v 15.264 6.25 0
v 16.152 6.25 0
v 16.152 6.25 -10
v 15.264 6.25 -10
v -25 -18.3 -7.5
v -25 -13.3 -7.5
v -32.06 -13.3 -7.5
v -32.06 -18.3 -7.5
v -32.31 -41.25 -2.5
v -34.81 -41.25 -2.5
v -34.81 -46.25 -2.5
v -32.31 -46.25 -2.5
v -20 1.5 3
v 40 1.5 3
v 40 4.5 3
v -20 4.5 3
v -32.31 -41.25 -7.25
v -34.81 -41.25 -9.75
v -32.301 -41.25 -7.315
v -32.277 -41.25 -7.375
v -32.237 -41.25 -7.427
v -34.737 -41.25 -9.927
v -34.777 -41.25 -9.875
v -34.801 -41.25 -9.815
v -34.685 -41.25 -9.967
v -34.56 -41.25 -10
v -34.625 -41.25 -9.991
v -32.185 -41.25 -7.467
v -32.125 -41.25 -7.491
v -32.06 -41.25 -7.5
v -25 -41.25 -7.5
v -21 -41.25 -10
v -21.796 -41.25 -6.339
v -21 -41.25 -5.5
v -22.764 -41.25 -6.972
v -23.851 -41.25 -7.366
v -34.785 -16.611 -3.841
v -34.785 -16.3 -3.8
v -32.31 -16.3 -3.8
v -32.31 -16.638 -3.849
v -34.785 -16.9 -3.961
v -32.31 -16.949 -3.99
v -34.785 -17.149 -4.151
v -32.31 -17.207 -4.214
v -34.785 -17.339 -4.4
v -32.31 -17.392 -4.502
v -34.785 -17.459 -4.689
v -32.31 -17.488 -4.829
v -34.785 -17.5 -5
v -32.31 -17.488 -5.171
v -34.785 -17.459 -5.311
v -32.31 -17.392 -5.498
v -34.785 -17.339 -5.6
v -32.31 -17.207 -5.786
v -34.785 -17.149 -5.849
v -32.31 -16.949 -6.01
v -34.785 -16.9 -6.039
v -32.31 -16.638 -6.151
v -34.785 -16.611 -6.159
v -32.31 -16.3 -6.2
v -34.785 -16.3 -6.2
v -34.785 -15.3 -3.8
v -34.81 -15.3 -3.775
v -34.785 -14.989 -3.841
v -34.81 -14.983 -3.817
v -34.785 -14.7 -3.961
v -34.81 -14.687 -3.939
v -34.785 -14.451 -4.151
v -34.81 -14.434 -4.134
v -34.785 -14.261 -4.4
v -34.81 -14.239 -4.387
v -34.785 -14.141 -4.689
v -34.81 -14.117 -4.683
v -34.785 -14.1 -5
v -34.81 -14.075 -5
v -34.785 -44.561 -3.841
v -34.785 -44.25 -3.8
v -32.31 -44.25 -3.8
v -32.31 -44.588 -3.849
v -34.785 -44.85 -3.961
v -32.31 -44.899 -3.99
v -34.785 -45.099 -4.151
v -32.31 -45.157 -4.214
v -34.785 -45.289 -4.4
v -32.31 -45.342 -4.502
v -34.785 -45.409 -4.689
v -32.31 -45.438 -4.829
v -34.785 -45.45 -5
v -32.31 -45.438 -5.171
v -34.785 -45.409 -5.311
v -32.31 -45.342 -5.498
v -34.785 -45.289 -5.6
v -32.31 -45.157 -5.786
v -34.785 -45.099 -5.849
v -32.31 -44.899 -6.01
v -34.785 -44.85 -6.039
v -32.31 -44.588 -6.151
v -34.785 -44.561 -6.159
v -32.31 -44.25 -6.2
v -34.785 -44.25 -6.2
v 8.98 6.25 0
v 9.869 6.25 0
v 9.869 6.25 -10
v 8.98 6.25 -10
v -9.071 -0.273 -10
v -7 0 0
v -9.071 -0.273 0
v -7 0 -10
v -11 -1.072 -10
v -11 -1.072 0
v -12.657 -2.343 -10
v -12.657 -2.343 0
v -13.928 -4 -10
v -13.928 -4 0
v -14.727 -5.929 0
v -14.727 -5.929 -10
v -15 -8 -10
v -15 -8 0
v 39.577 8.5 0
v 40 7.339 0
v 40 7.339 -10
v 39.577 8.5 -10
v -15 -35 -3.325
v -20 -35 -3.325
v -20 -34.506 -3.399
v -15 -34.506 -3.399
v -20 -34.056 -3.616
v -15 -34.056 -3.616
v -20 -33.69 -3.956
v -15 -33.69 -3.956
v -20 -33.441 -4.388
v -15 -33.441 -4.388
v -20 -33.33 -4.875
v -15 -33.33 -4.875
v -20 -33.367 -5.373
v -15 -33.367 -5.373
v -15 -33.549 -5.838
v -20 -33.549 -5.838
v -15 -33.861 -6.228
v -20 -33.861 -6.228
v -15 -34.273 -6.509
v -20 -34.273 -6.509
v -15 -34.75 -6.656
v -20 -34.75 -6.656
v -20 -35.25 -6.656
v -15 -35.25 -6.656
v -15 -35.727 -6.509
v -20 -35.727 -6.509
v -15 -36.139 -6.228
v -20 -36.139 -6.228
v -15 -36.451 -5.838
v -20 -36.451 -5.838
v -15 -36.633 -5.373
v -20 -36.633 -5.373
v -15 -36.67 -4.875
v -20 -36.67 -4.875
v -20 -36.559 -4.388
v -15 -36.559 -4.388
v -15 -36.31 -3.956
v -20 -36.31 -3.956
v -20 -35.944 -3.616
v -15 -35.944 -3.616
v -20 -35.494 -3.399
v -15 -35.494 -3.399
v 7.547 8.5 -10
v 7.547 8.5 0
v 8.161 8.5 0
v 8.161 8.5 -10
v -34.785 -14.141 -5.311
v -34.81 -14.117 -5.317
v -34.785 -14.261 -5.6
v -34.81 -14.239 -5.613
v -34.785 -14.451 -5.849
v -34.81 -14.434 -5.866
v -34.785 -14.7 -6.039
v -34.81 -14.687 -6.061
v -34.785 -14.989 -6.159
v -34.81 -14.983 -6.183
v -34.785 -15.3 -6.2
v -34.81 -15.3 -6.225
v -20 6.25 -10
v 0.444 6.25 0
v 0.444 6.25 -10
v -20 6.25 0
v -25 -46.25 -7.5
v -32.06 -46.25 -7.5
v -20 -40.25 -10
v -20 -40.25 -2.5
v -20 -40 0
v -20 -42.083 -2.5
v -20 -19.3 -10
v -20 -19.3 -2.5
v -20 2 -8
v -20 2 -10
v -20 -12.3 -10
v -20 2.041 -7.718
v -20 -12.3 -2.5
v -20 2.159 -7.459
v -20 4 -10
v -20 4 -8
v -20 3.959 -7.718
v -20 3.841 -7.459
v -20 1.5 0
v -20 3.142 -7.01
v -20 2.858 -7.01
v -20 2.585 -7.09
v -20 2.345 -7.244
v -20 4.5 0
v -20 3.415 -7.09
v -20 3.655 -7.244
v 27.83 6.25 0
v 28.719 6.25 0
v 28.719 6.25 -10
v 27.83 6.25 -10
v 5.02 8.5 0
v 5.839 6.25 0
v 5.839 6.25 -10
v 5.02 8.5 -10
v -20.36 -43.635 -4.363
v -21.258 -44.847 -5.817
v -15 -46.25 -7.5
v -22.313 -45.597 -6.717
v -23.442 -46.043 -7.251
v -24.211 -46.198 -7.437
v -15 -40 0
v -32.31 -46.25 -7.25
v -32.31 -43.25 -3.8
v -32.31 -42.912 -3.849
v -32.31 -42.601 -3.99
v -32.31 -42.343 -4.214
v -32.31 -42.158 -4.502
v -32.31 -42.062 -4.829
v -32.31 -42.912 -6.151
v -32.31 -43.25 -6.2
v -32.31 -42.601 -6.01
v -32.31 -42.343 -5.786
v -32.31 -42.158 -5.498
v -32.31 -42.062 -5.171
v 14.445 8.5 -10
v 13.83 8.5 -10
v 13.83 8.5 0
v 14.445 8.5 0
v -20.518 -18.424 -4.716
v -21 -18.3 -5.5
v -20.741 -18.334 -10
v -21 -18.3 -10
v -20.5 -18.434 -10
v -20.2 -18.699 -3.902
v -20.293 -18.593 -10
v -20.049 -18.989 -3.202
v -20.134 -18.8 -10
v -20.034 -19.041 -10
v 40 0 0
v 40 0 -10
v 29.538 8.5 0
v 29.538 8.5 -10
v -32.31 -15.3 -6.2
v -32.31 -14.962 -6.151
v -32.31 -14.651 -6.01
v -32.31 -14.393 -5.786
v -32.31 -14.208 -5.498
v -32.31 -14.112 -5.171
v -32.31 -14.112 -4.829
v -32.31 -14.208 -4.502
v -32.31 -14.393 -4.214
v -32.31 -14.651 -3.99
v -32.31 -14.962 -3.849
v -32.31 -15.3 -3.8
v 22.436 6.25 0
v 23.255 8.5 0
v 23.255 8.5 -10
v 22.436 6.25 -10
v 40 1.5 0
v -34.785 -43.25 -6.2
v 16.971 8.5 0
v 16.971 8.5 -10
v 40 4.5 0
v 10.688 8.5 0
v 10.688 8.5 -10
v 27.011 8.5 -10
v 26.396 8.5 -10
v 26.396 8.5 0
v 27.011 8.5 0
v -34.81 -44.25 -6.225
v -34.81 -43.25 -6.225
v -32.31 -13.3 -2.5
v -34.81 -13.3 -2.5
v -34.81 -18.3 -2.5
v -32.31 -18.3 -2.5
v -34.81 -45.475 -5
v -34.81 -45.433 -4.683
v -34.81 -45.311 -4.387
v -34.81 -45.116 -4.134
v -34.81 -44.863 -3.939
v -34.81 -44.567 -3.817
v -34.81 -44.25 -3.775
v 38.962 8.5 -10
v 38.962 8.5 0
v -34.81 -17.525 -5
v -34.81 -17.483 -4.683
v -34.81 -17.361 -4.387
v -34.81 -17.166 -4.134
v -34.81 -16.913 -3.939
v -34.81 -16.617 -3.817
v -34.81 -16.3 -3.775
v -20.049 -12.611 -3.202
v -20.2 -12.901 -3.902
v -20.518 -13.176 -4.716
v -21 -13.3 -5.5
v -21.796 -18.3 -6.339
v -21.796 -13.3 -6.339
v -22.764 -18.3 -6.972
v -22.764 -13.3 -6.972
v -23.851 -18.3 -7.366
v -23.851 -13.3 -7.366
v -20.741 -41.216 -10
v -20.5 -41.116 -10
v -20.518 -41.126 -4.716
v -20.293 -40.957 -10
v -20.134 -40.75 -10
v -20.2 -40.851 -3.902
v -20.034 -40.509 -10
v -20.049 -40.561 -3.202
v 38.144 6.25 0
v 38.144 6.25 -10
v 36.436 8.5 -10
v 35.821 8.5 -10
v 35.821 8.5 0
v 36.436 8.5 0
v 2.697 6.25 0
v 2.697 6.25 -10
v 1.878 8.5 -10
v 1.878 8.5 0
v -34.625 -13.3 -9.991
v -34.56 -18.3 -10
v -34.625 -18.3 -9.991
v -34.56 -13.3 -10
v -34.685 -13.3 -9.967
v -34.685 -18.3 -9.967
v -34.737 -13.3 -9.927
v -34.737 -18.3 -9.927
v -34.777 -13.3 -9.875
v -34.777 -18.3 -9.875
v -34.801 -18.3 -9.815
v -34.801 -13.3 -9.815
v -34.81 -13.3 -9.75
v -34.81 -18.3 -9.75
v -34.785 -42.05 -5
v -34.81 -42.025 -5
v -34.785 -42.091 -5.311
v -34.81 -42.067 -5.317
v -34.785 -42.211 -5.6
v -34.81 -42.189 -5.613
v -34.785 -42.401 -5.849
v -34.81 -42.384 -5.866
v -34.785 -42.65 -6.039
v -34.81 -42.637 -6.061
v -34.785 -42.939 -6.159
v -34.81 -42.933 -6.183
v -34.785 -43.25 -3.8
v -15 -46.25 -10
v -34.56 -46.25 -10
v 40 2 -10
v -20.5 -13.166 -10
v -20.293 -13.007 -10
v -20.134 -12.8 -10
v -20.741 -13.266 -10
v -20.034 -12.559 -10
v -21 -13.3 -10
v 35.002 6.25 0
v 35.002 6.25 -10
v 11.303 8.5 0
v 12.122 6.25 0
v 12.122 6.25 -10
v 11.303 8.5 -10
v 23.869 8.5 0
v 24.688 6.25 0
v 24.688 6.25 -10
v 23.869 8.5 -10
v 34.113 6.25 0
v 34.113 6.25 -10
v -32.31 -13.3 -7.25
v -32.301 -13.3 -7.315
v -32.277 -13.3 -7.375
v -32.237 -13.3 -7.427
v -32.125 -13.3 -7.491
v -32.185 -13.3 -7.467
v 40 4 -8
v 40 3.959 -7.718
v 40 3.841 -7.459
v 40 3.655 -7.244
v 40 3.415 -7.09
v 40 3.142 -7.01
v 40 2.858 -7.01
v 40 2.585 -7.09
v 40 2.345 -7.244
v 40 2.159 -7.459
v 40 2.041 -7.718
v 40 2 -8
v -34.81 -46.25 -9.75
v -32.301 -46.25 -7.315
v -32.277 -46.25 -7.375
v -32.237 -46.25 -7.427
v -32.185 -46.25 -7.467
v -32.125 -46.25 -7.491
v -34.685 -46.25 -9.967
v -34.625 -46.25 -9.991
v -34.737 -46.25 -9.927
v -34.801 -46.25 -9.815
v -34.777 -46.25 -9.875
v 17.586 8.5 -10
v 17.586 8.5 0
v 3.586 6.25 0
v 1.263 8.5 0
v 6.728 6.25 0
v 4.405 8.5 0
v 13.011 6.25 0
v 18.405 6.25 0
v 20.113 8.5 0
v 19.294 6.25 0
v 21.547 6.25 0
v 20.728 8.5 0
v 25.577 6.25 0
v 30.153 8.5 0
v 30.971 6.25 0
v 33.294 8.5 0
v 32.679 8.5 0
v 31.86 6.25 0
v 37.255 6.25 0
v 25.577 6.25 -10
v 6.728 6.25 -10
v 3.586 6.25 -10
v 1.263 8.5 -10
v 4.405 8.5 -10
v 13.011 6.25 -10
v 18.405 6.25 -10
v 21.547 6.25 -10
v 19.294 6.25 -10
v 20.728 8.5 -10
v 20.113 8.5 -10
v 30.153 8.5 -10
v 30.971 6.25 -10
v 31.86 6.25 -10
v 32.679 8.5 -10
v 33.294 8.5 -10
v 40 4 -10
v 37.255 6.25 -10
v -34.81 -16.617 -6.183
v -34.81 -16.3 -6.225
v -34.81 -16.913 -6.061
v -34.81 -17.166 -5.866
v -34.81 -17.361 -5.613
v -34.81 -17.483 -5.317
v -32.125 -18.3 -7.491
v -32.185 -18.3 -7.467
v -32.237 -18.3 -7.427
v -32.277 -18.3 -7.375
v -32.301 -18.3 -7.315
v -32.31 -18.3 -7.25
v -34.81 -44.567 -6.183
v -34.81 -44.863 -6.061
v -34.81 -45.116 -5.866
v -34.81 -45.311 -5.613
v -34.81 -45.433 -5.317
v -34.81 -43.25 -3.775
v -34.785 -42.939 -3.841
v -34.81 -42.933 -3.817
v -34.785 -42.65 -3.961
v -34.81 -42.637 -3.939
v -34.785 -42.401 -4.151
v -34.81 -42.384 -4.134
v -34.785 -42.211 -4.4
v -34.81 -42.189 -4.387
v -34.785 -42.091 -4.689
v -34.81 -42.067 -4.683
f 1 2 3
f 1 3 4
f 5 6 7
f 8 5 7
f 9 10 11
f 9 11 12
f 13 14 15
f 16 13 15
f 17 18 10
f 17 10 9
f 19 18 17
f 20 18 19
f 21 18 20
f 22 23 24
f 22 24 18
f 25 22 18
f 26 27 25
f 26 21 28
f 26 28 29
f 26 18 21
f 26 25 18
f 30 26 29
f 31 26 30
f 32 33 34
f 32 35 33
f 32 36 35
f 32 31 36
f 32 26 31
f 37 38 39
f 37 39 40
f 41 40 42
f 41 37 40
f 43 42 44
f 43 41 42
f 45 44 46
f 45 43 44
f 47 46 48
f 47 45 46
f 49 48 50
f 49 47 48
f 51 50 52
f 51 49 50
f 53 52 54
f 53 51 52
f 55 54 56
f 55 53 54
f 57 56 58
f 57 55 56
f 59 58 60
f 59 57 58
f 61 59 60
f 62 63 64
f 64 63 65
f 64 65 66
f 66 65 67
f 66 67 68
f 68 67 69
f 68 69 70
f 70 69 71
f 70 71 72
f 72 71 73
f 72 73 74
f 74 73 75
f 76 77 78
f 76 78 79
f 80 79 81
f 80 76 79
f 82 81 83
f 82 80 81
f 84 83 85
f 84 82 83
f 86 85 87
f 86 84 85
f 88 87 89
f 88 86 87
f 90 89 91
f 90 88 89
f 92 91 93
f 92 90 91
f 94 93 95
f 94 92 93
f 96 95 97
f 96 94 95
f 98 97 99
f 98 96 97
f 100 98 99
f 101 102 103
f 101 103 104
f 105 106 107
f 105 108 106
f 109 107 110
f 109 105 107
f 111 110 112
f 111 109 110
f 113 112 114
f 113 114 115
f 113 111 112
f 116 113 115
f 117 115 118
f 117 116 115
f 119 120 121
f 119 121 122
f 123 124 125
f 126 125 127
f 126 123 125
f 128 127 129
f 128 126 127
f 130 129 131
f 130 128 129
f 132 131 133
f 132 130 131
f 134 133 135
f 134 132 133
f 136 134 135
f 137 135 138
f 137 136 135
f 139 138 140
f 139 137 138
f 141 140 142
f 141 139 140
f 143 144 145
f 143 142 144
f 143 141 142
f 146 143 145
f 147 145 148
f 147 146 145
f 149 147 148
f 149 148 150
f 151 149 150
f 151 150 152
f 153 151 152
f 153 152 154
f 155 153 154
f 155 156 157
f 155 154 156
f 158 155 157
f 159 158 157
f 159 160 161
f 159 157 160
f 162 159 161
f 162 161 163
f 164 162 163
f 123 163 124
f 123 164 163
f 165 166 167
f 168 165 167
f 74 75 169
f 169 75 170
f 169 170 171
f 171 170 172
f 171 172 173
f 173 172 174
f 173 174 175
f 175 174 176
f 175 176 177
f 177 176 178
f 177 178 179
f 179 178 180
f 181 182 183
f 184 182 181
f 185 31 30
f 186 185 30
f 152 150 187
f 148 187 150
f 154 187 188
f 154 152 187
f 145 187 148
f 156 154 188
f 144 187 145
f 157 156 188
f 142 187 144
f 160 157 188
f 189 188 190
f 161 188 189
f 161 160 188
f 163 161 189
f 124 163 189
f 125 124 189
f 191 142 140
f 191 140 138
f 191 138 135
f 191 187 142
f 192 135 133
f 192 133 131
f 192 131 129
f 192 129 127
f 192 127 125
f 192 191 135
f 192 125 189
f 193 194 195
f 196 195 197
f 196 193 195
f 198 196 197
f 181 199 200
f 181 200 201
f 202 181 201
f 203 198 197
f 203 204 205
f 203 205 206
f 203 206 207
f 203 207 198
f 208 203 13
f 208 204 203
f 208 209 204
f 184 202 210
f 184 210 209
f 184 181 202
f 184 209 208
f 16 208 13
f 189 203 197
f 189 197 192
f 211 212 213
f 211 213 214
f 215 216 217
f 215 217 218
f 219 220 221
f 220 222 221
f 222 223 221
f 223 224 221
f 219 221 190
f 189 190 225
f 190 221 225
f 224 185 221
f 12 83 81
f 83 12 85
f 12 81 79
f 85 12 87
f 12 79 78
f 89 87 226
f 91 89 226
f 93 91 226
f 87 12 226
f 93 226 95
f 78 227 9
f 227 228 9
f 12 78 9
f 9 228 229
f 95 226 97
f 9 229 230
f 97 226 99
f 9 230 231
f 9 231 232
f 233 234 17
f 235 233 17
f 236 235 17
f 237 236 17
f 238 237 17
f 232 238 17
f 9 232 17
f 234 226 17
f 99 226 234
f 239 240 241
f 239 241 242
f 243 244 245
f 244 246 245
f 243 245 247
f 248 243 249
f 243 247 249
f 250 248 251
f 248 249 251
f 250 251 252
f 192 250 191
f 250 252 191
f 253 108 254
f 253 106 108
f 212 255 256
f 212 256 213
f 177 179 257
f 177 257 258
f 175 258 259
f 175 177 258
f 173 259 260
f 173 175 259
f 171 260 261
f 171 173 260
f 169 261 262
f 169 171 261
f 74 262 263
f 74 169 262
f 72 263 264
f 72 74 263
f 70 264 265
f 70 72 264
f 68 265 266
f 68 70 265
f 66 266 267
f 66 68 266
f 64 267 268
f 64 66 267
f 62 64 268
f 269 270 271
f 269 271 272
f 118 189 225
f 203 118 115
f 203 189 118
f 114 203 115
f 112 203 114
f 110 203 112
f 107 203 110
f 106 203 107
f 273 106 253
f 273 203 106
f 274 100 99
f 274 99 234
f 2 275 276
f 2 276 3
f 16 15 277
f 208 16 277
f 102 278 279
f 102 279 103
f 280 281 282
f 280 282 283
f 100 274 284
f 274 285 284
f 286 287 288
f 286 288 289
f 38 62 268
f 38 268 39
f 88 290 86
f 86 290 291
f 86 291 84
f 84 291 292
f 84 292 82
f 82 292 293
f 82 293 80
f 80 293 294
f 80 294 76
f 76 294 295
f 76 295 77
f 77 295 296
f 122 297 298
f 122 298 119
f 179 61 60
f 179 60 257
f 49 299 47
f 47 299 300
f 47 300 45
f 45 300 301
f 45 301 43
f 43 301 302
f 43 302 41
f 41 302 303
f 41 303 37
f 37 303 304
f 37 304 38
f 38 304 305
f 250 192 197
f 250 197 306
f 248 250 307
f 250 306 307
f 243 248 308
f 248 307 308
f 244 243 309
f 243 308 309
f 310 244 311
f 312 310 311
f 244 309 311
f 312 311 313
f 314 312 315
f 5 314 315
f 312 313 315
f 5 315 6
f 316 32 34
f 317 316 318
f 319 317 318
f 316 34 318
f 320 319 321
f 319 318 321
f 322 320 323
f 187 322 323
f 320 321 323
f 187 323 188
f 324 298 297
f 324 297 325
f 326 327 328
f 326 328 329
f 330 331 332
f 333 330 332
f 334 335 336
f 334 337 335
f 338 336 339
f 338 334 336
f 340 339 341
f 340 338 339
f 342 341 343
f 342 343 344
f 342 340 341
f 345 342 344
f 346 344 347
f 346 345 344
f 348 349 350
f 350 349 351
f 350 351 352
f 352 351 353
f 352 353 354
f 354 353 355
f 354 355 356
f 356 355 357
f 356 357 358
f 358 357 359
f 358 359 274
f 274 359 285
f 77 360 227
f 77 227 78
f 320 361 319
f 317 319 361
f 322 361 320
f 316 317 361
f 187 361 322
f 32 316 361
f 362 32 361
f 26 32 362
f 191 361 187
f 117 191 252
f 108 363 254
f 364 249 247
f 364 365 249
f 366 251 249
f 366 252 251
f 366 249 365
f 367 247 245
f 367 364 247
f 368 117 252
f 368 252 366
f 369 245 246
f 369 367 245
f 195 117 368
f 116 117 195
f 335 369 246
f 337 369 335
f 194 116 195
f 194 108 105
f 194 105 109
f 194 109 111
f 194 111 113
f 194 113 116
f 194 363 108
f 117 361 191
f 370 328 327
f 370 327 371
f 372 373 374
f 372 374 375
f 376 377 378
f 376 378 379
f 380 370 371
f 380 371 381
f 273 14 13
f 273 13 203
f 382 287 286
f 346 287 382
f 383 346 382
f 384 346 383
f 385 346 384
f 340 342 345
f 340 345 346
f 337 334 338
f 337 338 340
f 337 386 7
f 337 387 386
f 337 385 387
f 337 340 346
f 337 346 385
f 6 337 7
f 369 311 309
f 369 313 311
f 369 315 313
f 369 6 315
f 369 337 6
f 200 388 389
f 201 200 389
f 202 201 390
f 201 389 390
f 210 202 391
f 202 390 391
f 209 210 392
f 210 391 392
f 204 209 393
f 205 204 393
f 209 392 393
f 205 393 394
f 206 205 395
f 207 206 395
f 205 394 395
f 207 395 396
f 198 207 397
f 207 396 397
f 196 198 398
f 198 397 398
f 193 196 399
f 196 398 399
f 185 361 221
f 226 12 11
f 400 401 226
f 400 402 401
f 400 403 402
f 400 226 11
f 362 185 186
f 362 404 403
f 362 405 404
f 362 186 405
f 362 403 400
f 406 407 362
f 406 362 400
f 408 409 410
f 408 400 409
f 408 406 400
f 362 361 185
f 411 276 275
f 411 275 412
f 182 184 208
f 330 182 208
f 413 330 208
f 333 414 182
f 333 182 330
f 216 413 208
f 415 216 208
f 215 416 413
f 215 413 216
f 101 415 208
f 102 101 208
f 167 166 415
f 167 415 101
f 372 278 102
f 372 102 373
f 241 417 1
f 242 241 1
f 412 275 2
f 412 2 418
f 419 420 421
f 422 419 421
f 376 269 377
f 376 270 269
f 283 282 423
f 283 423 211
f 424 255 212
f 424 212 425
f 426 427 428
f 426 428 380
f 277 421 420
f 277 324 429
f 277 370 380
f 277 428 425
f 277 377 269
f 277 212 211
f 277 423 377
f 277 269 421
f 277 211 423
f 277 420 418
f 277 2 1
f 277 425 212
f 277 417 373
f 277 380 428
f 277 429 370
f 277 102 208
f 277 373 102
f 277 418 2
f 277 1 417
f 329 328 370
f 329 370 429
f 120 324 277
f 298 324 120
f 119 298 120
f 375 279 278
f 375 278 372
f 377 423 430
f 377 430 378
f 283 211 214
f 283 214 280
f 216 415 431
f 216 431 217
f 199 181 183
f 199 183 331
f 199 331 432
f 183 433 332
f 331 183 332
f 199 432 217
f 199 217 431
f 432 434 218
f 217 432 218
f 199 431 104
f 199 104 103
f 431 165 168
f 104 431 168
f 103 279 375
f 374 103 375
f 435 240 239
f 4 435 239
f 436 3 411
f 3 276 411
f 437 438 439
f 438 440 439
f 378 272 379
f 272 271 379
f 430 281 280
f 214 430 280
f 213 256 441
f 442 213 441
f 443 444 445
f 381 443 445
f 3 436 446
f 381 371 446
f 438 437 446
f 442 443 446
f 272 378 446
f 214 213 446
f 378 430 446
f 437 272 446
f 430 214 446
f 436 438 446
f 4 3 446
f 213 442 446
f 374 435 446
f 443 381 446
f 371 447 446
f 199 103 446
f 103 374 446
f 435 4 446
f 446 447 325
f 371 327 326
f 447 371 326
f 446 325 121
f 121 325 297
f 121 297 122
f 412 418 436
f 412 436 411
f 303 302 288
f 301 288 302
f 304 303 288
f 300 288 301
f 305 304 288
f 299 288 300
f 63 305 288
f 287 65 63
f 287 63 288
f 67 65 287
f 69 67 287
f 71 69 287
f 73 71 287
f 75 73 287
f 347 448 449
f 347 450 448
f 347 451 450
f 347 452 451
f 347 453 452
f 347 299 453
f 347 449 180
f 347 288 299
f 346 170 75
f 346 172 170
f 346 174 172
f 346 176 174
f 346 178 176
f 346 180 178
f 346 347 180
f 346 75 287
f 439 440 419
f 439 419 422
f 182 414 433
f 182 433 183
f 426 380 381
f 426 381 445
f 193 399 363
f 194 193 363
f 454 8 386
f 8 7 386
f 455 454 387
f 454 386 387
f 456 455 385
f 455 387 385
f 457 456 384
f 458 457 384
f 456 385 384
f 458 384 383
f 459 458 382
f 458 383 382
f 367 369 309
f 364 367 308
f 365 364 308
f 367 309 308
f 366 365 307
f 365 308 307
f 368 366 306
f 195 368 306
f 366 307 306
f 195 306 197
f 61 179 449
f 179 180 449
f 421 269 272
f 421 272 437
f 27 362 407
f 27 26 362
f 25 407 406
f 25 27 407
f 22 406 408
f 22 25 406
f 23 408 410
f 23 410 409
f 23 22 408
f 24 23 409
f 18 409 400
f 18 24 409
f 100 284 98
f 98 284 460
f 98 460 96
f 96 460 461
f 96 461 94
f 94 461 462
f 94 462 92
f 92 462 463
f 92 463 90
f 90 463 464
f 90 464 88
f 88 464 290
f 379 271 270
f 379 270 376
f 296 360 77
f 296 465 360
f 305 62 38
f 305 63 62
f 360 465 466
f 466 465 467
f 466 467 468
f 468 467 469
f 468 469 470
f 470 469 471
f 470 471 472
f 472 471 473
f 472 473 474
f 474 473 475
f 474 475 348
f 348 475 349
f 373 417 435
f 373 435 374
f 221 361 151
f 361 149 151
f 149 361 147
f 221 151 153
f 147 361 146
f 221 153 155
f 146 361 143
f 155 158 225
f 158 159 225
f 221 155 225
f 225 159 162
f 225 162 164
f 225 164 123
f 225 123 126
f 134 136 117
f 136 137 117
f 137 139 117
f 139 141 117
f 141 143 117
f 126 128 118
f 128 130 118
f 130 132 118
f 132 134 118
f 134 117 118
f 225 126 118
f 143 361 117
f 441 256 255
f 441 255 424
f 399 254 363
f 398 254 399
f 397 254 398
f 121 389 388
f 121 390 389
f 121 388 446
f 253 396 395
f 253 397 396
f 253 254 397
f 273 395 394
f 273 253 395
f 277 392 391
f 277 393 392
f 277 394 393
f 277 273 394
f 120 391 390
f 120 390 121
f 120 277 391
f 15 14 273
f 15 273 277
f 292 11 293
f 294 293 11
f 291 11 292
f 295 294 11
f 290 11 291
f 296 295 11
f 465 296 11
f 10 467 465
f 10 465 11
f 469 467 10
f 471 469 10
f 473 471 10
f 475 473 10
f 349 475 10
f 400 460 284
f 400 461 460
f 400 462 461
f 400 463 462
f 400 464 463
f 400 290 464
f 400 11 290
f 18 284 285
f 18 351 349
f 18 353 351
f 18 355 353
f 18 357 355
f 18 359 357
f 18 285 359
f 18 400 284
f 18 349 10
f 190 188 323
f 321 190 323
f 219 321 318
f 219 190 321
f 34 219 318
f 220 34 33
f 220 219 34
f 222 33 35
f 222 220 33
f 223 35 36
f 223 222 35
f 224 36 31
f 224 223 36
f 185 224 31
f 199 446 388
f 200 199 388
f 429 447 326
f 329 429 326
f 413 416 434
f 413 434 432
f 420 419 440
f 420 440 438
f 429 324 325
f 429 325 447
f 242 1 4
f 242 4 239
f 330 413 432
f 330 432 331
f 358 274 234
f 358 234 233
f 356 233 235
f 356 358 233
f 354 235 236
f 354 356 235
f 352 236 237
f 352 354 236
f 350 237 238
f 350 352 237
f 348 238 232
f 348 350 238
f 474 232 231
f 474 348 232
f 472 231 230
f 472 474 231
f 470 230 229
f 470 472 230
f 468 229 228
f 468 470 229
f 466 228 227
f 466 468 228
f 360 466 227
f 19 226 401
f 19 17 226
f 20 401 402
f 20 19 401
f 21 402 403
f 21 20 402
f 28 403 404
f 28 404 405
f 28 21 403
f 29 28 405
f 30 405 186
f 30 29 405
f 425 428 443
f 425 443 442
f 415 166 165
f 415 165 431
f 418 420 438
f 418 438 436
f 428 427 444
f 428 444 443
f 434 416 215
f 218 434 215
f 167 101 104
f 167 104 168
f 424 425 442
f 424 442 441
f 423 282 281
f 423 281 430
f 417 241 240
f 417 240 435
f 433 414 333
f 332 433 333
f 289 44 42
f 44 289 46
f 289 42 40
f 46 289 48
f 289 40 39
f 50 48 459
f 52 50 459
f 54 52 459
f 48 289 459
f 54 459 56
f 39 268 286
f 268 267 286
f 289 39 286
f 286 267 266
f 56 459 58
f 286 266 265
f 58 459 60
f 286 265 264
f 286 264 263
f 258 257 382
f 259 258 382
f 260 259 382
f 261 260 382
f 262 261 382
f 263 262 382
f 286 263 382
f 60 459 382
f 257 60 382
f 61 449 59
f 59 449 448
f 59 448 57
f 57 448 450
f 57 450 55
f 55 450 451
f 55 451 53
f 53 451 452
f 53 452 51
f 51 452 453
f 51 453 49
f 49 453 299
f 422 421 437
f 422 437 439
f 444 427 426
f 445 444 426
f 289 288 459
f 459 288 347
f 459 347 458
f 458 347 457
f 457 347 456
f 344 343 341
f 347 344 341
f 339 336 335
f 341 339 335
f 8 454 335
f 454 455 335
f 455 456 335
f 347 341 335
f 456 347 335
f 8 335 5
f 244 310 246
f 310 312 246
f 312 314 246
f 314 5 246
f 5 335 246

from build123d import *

# Parameters (mm, degrees)
BLANKSKE_W               = 40
BLANKSKE_H               = 8.5
BLANK_DEPTH              = 10
TOOTHCUTSIM_DEPTH        = 43.09809972
TEETHCUTS_COUNT          = 14
TEETHCUTS_PITCH          = 3.14159265
BOSS_EXTRUDE1_DEPTH      = 10
SKETCH2_W                = 3
SKETCH2_H                = 3
BOSS_EXTRUDE2_DEPTH      = 60
CUT_EXTRUDE2_DEPTH       = 73.801098893
MOVE_FACE2_BY            = 5
FILLET2_R                = 8
SKETCH3_R                = 1.675
CUT_EXTRUDE1_DEPTH       = 69.738635424
SKETCH6_W                = 14.81
SKETCH6_H                = 5
BOSS_EXTRUDE3_DEPTH      = 2.5
SKETCH7_W                = 2.5
SKETCH7_H                = 5
BOSS_EXTRUDE4_DEPTH      = 5
M2_START                 = -34.81
M2_CLEARANCE_SLOT1_DEPTH = 2.5
BOSS_EXTRUDE5_DEPTH      = 5
FILLET3_R                = 5
FILLET4_R                = 1
FILLET5_R                = 0.25


with BuildPart() as part:
    # BlankSke → Blank (new body)
    with BuildSketch(Plane.XY):
        with Locations((20, 4.25)):
            Rectangle(BLANKSKE_W, BLANKSKE_H)
    extrude(amount=-BLANK_DEPTH)

    # TooCutSkeSim → ToothCutSim (cut, through all)
    with BuildSketch(Plane.XY):
        Polygon((0.44443537, 6.25), (-0.44443537, 6.25), (-1.272613241, 8.5254), (1.272613241, 8.5254), align=None)
    toothcutsim = extrude(amount=-TOOTHCUTSIM_DEPTH, mode=Mode.SUBTRACT)

    # TeethCuts: ToothCutSim ×14
    with Locations(*[(i * TEETHCUTS_PITCH, 0, 0) for i in range(1, TEETHCUTS_COUNT)]):
        add(toothcutsim, mode=Mode.SUBTRACT)

    # Sketch1 → Boss-Extrude1 (add)
    with BuildSketch(Plane.XY):
        Polygon((-20, 0), (-20, -40), (-10, -40), (-10, 0), (0, 0), (0, 6.25), (-20, 6.25), align=None)
    extrude(amount=-BOSS_EXTRUDE1_DEPTH)

    # Sketch2 → Boss-Extrude2 (add)
    with BuildSketch(Plane(origin=(40, 0, 0), x_dir=(0, 0, -1), z_dir=(1, 0, 0))):
        with Locations((-1.5, 3)):
            Rectangle(SKETCH2_W, SKETCH2_H)
    extrude(amount=-BOSS_EXTRUDE2_DEPTH)

    # Sketch5 → Cut-Extrude2 (cut, through all)
    with BuildSketch(Plane(origin=(40, 0, 0), x_dir=(0, 0, -1), z_dir=(1, 0, 0))):
        with BuildLine():
            Line((10, 2), (10, 4))
            Line((10, 4), (8, 4))
            ThreePointArc((8, 4), (7, 3), (8, 2))
            Line((8, 2), (10, 2))
        make_face()
    extrude(amount=-CUT_EXTRUDE2_DEPTH, mode=Mode.SUBTRACT)

    # Move Face2: a face moved inward by 5.0
    extrude(part.faces().sort_by_distance((-10, -20, -5))[0], amount=MOVE_FACE2_BY, dir=(-1, 0, 0), mode=Mode.SUBTRACT)

    # Fillet2
    fillet2_edges = [part.edges().sort_by_distance(p)[0] for p in [
        (-15, 0, -5),
    ]]
    fillet(fillet2_edges, radius=FILLET2_R)

    # Sketch3 → Cut-Extrude1 (cut, through all)
    with BuildSketch(Plane.ZY.offset(15)):
        with Locations((-5, -35)):
            Circle(SKETCH3_R)
    extrude(amount=CUT_EXTRUDE1_DEPTH, mode=Mode.SUBTRACT)

    # Sketch6 → Boss-Extrude3 (add)
    with BuildSketch(Plane(origin=(0, 0, -10), x_dir=(-1, 0, 0), z_dir=(0, 0, -1))):
        with Locations((27.405, -15.8)):
            Rectangle(SKETCH6_W, SKETCH6_H)
        Polygon((20, -40), (15, -40), (15, -46.25), (34.81, -46.25), (34.81, -41.25), (20, -41.25), align=None)
    extrude(amount=-BOSS_EXTRUDE3_DEPTH)

    # Sketch7 → Boss-Extrude4 (add)
    with BuildSketch(Plane.XY.offset(-7.5)):
        with Locations((-33.56, -15.8)):
            Rectangle(SKETCH7_W, SKETCH7_H)
        with Locations((-33.56, -43.75)):
            Rectangle(SKETCH7_W, SKETCH7_H)
    extrude(amount=BOSS_EXTRUDE4_DEPTH)

    # M2 Clearance Slot1: read off the stored shape, not the designer's step
    # M2 Clearance Slot1 outline → M2 Clearance Slot1 (cut)
    with BuildSketch(Plane.YZ.offset(M2_START)):
        with BuildLine():
            ThreePointArc((-44.25, -3.8), (-45.45, -5), (-44.25, -6.2))
            Line((-44.25, -6.2), (-43.25, -6.2))
            ThreePointArc((-43.25, -6.2), (-42.05, -5), (-43.25, -3.8))
            Line((-43.25, -3.8), (-44.25, -3.8))
        make_face()
        with BuildLine():
            ThreePointArc((-16.3, -3.8), (-17.5, -5), (-16.3, -6.2))
            Line((-16.3, -6.2), (-15.3, -6.2))
            ThreePointArc((-15.3, -6.2), (-14.1, -5), (-15.3, -3.8))
            Line((-15.3, -3.8), (-16.3, -3.8))
        make_face()
    extrude(amount=M2_CLEARANCE_SLOT1_DEPTH, mode=Mode.SUBTRACT)

    # M2 Clearance Slot1 2: loft between two sections, ruled curve by curve
    m2_clearance_slot1_2_from = [
        Edge.make_three_point_arc((-34.785, -43.25, -3.8), (-34.785, -42.401471863, -4.151471863), (-34.785, -42.05, -5)),
        Edge.make_three_point_arc((-34.785, -42.05, -5), (-34.785, -42.401471863, -5.848528137), (-34.785, -43.25, -6.2)),
        Edge.make_three_point_arc((-34.785, -44.25, -6.2), (-34.785, -45.098528137, -5.848528137), (-34.785, -45.45, -5)),
        Edge.make_three_point_arc((-34.785, -45.45, -5), (-34.785, -45.098528137, -4.151471863), (-34.785, -44.25, -3.8)),
        Edge.make_line((-34.785, -43.25, -6.2), (-34.785, -44.25, -6.2)),
        Edge.make_line((-34.785, -43.25, -3.8), (-34.785, -44.25, -3.8)),
    ]
    m2_clearance_slot1_2_to = [
        Edge.make_three_point_arc((-34.81, -43.25, -3.775), (-34.81, -42.383794193, -4.133794193), (-34.81, -42.025, -5)),
        Edge.make_three_point_arc((-34.81, -42.025, -5), (-34.81, -42.383794193, -5.866205807), (-34.81, -43.25, -6.225)),
        Edge.make_three_point_arc((-34.81, -44.25, -6.225), (-34.81, -45.116205807, -5.866205807), (-34.81, -45.475, -5)),
        Edge.make_three_point_arc((-34.81, -45.475, -5), (-34.81, -45.116205807, -4.133794193), (-34.81, -44.25, -3.775)),
        Edge.make_line((-34.81, -43.25, -6.225), (-34.81, -44.25, -6.225)),
        Edge.make_line((-34.81, -43.25, -3.775), (-34.81, -44.25, -3.775)),
    ]
    m2_clearance_slot1_2 = Solid(Shell([*[Face.make_surface_from_curves(m2_clearance_slot1_2_from[k], m2_clearance_slot1_2_to[k]) for k in range(6)], Face(Wire(m2_clearance_slot1_2_from)), Face(Wire(m2_clearance_slot1_2_to))]))
    add(m2_clearance_slot1_2, mode=Mode.SUBTRACT)

    # M2 Clearance Slot1 3: loft between two sections, ruled curve by curve
    m2_clearance_slot1_3_from = [
        Edge.make_three_point_arc((-34.785, -15.3, -3.8), (-34.785, -14.451471863, -4.151471863), (-34.785, -14.1, -5)),
        Edge.make_three_point_arc((-34.785, -14.1, -5), (-34.785, -14.451471863, -5.848528137), (-34.785, -15.3, -6.2)),
        Edge.make_three_point_arc((-34.785, -16.3, -6.2), (-34.785, -17.148528137, -5.848528137), (-34.785, -17.5, -5)),
        Edge.make_three_point_arc((-34.785, -17.5, -5), (-34.785, -17.148528137, -4.151471863), (-34.785, -16.3, -3.8)),
        Edge.make_line((-34.785, -15.3, -6.2), (-34.785, -16.3, -6.2)),
        Edge.make_line((-34.785, -15.3, -3.8), (-34.785, -16.3, -3.8)),
    ]
    m2_clearance_slot1_3_to = [
        Edge.make_three_point_arc((-34.81, -15.3, -3.775), (-34.81, -14.433794193, -4.133794193), (-34.81, -14.075, -5)),
        Edge.make_three_point_arc((-34.81, -14.075, -5), (-34.81, -14.433794193, -5.866205807), (-34.81, -15.3, -6.225)),
        Edge.make_three_point_arc((-34.81, -16.3, -6.225), (-34.81, -17.166205807, -5.866205807), (-34.81, -17.525, -5)),
        Edge.make_three_point_arc((-34.81, -17.525, -5), (-34.81, -17.166205807, -4.133794193), (-34.81, -16.3, -3.775)),
        Edge.make_line((-34.81, -15.3, -6.225), (-34.81, -16.3, -6.225)),
        Edge.make_line((-34.81, -15.3, -3.775), (-34.81, -16.3, -3.775)),
    ]
    m2_clearance_slot1_3 = Solid(Shell([*[Face.make_surface_from_curves(m2_clearance_slot1_3_from[k], m2_clearance_slot1_3_to[k]) for k in range(6)], Face(Wire(m2_clearance_slot1_3_from)), Face(Wire(m2_clearance_slot1_3_to))]))
    add(m2_clearance_slot1_3, mode=Mode.SUBTRACT)

    # Sketch10 → Boss-Extrude5 (add)
    with BuildSketch(Plane(origin=(-15, 0, 0), x_dir=(0, 0, -1), z_dir=(1, 0, 0))):
        Polygon((7.5, -46.25), (0, -40), (7.5, -40), align=None)
    extrude(amount=-BOSS_EXTRUDE5_DEPTH)

    # Fillet3
    fillet3_edges = [part.edges().sort_by_distance(p)[0] for p in [
        (-20, -15.8, -7.5),
        (-20, -43.75, -7.5),
    ]]
    fillet(fillet3_edges, radius=FILLET3_R)

    # Fillet4
    fillet4_edges = [part.edges().sort_by_distance(p)[0] for p in [
        (-20, -18.3, -6.25),
        (-20, -13.3, -6.25),
        (-20, -41.25, -6.25),
    ]]
    fillet(fillet4_edges, radius=FILLET4_R)

    # Fillet5
    fillet5_edges = [part.edges().sort_by_distance(p)[0] for p in [
        (-34.81, -15.8, -10),
        (-34.81, -43.75, -10),
        (-32.31, -15.8, -7.5),
        (-32.31, -43.75, -7.5),
    ]]
    fillet(fillet5_edges, radius=FILLET5_R)


solid = part.part
